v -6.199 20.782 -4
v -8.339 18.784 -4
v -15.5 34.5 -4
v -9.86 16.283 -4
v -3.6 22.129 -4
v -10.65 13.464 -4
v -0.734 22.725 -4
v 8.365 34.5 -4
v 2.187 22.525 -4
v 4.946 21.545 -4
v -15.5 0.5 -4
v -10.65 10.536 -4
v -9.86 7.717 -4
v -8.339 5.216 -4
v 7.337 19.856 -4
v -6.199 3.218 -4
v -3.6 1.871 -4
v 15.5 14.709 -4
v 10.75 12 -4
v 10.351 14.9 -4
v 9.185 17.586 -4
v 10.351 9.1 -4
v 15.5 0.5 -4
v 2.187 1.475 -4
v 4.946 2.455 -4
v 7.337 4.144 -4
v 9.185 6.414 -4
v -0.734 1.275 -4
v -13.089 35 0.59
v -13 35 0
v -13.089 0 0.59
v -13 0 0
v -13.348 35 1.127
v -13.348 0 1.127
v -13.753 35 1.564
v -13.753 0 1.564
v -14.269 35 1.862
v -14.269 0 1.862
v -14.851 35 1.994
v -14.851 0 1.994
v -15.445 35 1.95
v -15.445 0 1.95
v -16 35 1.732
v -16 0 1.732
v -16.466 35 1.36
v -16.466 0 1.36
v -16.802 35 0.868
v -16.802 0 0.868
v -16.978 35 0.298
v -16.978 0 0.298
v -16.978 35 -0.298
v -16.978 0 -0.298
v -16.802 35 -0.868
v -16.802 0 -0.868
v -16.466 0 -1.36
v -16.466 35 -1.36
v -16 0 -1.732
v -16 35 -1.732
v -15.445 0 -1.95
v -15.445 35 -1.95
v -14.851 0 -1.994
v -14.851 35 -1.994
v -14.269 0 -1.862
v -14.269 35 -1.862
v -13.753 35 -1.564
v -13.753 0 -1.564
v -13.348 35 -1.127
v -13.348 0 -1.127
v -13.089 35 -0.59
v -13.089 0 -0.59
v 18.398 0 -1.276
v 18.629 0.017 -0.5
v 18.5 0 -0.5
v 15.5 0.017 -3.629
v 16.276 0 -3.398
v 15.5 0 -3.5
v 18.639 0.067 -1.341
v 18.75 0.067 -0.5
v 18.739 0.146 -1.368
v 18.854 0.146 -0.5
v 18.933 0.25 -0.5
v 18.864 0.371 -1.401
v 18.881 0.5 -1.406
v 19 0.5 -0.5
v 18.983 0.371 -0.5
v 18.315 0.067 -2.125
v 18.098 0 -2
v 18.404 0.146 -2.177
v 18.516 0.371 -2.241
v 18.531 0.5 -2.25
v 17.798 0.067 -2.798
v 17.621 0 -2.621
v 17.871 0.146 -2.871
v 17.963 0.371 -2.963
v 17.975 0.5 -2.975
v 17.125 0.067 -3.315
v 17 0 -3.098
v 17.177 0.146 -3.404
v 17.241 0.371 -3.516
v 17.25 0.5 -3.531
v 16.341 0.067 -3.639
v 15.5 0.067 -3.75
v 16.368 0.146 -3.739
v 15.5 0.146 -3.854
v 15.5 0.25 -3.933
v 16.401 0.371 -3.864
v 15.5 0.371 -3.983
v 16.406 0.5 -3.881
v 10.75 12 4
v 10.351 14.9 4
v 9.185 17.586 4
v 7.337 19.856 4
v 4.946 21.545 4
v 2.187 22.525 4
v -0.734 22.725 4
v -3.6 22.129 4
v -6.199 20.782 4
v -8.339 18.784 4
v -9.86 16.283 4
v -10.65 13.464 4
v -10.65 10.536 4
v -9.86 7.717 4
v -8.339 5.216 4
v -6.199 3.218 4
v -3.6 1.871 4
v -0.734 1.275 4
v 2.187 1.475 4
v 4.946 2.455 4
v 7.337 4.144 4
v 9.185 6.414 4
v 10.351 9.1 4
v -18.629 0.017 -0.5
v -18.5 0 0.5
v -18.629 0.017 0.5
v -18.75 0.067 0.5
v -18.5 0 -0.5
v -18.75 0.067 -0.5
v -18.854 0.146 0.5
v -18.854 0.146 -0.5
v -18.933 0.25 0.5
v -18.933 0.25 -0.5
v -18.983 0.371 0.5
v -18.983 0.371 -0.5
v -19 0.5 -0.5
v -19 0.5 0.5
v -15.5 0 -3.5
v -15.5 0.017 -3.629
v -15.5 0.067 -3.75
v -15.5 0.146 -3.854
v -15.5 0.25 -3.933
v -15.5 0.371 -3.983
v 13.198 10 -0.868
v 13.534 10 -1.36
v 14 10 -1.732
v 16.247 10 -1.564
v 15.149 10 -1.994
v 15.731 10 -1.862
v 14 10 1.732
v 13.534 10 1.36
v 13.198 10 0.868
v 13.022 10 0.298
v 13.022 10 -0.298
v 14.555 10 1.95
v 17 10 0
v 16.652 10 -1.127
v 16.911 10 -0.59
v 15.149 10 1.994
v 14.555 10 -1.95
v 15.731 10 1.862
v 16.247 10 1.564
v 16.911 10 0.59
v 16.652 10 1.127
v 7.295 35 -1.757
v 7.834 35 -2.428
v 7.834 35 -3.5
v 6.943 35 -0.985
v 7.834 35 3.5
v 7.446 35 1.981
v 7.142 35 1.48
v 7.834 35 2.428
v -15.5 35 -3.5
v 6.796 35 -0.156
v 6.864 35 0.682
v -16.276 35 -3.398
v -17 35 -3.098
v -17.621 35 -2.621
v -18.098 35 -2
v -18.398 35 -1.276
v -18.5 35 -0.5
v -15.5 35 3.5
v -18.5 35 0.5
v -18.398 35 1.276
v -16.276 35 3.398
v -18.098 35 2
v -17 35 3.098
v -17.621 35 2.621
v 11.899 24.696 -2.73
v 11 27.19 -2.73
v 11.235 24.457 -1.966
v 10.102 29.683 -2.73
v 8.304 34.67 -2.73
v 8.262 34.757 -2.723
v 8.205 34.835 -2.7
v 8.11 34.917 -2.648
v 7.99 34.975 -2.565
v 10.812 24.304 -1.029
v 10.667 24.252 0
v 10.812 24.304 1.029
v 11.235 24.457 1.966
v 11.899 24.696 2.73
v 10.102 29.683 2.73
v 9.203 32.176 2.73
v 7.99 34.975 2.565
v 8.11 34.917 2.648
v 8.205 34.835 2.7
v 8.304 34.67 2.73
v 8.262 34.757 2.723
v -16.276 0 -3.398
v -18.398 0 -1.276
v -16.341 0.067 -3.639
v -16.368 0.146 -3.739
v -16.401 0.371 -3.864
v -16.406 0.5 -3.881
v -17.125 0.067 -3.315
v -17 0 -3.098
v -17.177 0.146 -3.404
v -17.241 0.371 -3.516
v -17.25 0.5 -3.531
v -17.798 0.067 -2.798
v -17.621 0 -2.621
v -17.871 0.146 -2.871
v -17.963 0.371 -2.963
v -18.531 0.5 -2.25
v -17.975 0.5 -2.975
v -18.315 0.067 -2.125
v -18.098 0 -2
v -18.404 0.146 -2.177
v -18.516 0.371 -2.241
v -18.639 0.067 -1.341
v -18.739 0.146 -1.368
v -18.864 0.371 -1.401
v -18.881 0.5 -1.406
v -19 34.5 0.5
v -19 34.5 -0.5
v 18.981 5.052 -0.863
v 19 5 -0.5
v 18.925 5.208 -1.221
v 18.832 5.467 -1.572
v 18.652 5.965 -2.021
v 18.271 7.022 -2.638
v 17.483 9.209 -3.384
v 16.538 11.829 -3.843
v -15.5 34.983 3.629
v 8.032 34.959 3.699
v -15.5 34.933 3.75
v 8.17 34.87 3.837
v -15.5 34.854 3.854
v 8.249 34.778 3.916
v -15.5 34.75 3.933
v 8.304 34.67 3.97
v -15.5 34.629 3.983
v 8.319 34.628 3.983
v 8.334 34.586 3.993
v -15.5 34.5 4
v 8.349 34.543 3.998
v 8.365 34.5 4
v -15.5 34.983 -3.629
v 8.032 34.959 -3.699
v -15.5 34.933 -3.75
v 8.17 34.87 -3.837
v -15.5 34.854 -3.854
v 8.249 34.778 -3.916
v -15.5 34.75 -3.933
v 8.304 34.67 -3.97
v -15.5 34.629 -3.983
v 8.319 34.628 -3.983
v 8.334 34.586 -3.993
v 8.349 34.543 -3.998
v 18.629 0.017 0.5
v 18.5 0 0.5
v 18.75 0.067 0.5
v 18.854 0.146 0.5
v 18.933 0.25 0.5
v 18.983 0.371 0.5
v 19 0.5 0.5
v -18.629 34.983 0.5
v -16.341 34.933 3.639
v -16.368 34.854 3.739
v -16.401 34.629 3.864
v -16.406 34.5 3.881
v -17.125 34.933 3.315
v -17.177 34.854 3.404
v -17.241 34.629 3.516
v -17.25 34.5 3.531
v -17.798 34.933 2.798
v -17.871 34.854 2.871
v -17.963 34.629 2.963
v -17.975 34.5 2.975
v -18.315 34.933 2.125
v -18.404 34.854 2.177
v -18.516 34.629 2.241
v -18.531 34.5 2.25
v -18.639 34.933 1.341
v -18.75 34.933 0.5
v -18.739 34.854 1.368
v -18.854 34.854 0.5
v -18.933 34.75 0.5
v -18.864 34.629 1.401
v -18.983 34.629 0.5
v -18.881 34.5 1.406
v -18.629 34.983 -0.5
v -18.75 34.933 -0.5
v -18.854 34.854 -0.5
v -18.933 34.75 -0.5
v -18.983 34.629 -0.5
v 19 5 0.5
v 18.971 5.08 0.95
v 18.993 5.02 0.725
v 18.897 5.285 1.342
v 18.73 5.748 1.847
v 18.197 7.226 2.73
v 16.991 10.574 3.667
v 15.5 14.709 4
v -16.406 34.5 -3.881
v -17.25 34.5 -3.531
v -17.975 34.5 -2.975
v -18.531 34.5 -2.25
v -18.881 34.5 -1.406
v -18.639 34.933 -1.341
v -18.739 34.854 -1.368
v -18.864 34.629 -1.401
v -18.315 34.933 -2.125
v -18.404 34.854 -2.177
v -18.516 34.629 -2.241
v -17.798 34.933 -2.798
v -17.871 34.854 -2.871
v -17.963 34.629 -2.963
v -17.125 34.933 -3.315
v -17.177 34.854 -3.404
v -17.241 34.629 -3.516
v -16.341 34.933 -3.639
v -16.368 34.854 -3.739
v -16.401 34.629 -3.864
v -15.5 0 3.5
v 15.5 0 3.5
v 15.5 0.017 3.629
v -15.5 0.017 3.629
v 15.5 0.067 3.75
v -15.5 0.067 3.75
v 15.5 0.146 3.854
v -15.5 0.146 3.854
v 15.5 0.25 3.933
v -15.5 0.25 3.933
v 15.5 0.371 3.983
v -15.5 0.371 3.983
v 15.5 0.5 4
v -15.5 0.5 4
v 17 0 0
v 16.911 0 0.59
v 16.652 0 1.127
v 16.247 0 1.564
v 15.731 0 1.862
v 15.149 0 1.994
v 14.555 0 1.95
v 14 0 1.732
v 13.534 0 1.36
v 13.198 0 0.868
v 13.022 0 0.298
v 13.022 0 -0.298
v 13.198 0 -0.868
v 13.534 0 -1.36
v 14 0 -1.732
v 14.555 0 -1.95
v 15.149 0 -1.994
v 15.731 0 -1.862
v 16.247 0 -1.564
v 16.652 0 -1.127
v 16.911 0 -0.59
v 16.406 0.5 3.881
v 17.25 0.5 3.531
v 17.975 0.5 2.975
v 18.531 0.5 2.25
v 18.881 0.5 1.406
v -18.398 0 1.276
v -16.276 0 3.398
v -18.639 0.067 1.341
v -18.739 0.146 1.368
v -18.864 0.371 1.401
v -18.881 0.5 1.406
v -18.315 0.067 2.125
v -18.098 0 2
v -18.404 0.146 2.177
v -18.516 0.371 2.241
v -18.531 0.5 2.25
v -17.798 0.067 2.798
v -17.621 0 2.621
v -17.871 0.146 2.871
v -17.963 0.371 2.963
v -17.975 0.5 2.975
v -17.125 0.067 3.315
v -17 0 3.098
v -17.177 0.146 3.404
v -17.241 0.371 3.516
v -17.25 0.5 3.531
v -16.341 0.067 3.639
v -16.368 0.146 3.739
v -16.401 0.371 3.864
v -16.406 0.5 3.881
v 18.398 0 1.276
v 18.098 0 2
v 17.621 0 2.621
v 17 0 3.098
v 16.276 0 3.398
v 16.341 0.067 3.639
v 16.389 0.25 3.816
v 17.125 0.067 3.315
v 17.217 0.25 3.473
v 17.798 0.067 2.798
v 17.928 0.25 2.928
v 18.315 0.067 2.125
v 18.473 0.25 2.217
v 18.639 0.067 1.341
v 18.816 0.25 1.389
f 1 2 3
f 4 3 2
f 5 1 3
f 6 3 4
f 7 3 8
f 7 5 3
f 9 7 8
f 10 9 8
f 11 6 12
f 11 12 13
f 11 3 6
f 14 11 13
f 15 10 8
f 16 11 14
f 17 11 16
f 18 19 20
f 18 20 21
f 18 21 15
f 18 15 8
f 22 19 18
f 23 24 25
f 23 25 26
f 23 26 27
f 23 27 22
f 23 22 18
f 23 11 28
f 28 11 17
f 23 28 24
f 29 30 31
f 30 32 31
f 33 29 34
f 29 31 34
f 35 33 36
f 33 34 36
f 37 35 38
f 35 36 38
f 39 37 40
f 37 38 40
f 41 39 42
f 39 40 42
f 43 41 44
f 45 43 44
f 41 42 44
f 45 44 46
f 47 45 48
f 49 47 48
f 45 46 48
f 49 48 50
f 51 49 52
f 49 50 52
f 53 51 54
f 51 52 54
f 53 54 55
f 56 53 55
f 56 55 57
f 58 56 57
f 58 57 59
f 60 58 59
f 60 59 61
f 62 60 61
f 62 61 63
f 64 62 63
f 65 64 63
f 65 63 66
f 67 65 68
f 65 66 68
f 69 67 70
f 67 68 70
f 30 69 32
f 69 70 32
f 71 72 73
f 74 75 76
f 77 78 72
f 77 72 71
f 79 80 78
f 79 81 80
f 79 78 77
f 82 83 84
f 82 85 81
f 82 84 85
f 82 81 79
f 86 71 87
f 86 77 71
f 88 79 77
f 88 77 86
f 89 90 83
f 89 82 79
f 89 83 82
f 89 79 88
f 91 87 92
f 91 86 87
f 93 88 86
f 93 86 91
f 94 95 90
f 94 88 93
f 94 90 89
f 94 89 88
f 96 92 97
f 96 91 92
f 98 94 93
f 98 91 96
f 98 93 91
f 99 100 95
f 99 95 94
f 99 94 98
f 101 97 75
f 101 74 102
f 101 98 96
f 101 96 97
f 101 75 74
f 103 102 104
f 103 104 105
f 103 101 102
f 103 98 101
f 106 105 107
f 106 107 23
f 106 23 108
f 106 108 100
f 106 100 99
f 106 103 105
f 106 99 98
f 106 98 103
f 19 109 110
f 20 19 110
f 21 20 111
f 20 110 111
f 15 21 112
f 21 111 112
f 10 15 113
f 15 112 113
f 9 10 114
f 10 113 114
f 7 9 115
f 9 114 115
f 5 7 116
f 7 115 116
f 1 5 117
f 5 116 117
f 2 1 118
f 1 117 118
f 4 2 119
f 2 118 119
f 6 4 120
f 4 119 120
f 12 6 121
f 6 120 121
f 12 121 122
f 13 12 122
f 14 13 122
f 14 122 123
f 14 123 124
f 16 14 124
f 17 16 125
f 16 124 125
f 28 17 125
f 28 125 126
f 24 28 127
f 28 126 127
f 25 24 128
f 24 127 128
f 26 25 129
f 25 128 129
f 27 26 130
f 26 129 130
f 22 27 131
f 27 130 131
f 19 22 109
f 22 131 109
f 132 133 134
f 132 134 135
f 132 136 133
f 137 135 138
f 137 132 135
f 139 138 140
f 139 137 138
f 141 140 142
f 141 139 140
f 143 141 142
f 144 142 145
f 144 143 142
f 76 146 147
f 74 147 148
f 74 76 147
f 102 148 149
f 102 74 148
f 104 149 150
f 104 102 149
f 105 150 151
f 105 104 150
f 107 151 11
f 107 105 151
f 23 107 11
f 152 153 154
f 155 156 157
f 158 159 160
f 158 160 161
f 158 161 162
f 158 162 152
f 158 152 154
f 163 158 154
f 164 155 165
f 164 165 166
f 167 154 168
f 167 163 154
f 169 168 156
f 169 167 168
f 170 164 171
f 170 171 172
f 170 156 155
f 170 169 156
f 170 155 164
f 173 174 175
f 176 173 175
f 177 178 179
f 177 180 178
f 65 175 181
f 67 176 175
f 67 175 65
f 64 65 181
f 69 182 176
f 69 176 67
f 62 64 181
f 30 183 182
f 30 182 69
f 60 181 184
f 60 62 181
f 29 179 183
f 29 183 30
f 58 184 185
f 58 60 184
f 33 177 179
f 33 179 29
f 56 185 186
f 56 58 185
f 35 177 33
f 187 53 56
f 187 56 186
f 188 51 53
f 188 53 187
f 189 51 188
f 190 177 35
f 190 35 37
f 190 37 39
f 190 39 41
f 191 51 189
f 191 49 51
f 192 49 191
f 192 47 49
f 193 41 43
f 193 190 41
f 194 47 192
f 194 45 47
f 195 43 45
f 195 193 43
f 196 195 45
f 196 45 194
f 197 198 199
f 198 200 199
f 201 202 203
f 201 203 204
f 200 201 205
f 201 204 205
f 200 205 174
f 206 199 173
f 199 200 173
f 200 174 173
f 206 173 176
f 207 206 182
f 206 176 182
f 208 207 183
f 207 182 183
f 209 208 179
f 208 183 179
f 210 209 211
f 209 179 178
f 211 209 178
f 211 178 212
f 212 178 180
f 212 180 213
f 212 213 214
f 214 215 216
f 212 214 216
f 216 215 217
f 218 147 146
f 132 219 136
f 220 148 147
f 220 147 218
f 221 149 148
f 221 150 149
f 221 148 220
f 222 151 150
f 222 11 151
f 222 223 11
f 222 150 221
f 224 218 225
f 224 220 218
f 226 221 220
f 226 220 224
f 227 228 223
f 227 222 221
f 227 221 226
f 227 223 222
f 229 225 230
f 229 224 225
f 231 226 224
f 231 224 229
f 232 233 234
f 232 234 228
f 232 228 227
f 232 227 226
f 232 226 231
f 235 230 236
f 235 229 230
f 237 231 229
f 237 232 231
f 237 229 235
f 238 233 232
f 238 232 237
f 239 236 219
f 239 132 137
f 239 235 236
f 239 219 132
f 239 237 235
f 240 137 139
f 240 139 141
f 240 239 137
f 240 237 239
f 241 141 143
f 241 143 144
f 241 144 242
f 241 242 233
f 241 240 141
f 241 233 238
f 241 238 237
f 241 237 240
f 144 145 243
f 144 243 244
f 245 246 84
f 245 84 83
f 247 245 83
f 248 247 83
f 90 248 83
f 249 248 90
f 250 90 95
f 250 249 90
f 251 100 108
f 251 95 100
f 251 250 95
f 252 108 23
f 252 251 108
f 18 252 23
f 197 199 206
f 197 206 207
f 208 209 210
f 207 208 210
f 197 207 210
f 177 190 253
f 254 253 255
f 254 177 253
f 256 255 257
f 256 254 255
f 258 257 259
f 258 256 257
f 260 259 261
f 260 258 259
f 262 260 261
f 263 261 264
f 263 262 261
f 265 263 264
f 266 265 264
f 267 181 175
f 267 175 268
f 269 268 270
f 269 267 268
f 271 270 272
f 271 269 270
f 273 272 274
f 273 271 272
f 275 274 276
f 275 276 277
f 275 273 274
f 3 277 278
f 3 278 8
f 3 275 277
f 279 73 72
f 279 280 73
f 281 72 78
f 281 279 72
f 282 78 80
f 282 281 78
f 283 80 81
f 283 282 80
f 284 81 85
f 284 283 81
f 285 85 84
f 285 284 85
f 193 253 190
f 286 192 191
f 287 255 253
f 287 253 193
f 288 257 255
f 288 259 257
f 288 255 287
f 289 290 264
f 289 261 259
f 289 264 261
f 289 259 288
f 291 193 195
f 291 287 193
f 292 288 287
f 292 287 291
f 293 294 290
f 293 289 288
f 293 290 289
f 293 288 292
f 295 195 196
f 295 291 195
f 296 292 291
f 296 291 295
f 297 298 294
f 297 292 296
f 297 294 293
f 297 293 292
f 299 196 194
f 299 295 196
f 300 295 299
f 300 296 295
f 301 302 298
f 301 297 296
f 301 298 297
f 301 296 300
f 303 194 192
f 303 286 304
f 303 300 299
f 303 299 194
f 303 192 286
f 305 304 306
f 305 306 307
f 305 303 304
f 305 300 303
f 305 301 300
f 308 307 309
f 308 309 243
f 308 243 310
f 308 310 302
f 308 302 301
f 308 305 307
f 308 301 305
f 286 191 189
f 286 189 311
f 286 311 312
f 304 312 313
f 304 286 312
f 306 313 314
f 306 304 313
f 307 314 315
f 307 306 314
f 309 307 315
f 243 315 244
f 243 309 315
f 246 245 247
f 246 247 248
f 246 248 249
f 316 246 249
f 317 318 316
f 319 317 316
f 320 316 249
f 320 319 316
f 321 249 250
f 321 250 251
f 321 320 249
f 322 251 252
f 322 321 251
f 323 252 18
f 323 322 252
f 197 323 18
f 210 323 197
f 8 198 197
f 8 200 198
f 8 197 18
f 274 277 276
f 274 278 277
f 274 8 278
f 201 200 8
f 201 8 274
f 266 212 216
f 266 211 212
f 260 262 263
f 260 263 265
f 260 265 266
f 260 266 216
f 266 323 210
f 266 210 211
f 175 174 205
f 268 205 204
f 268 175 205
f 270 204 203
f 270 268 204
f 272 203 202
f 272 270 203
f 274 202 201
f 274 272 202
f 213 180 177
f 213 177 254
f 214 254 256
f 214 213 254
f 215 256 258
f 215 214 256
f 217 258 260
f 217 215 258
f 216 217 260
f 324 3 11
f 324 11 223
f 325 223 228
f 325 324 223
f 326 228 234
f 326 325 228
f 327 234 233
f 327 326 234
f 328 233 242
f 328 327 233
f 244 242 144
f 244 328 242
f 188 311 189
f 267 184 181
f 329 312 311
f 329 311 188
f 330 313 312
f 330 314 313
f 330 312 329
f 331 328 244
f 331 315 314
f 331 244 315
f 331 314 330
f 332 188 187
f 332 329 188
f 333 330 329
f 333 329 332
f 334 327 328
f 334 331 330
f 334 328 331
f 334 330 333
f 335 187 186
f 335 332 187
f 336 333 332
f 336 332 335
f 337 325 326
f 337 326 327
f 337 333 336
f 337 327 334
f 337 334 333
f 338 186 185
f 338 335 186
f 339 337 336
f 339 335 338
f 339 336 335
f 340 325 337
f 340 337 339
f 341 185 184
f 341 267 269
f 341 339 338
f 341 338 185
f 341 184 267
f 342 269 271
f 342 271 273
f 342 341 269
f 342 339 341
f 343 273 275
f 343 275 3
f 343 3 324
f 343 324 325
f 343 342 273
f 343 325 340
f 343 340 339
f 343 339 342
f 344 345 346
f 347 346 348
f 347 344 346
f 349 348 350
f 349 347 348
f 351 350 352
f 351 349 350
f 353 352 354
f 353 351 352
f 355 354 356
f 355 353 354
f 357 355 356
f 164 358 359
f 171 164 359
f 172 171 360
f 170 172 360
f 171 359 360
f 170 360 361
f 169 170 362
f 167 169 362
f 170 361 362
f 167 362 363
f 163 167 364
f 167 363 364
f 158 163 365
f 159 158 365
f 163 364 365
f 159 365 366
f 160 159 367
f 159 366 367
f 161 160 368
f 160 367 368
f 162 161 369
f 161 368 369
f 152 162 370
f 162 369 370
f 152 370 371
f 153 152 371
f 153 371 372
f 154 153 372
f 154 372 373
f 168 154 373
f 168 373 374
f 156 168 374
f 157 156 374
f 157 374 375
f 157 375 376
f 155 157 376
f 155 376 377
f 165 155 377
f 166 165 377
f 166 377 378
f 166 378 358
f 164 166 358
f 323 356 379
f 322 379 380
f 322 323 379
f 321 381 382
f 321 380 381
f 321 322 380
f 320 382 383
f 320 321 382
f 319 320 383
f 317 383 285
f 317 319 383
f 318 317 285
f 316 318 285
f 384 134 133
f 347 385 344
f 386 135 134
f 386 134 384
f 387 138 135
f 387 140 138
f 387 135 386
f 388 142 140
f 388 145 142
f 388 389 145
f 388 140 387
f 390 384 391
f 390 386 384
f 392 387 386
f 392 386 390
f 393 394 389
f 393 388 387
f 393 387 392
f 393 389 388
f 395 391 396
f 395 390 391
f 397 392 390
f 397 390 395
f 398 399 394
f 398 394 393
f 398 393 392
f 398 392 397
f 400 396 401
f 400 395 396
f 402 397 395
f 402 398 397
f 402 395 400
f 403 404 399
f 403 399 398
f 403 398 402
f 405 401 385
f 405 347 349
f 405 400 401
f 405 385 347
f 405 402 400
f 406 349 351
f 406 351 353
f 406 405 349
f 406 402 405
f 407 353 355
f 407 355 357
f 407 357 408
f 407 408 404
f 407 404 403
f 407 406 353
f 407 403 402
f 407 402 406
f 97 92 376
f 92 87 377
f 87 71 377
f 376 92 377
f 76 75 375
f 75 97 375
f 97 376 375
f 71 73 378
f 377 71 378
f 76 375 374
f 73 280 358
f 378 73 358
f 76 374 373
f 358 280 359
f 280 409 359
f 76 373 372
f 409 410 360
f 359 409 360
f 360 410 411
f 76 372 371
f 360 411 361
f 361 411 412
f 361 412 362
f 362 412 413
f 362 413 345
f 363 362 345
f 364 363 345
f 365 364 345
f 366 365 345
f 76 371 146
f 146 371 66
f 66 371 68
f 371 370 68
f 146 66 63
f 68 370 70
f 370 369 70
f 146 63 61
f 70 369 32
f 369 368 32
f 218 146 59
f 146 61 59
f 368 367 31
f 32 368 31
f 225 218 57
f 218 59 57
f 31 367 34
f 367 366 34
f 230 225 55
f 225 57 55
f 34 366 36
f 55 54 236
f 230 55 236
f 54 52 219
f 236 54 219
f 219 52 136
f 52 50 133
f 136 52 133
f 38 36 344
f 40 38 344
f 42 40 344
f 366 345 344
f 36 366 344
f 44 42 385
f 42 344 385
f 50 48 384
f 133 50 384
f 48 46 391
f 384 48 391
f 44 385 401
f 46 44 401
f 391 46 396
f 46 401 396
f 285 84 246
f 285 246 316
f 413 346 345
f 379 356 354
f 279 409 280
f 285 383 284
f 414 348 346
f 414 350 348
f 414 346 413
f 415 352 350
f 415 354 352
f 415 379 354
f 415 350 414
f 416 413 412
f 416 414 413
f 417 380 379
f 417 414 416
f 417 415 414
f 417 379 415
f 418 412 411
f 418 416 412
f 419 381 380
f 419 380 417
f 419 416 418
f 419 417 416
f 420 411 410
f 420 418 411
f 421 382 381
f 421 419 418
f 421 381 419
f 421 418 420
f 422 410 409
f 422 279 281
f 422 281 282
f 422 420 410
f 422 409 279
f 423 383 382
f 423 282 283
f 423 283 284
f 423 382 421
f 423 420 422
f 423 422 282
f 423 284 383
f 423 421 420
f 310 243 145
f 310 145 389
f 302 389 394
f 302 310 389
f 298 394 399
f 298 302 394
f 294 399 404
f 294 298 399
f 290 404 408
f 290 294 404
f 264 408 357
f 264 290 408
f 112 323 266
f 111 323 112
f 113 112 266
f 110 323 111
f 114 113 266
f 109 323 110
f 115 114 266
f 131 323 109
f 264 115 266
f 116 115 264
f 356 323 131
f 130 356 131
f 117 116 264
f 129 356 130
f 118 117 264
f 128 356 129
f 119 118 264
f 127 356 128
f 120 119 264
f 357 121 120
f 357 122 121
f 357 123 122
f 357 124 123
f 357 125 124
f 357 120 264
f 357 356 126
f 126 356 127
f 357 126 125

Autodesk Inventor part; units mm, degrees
ref_plane "YZ Plane" through (0, 0, 0) normal (1, 0, 0) x (0, 1, 0)
ref_plane "XZ Plane" through (0, 0, 0) normal (0, 1, 0) x (-1, 0, 0)
ref_plane "XY Plane" through (0, 0, 0) normal (0, 0, 1) x (1, 0, 0)
sketch "Эскиз2" plane through (0, 0, 0) normal (0, 1, 0) x (-1, 0, 0)
  line L0 (19, -4) -> (-19, -4)
  line L1 (-19, -4) -> (-19, 4)
  line L2 (-19, 4) -> (19, 4)
  line L3 (19, 4) -> (19, -4)
  line L4 (19, -4) -> (-19, 4) construction
  line L5 (-19, -4) -> (19, 4) construction
  line L6 (19, 0) -> (-19, 0) construction
  circle A0 centre (-15, 0) radius 2
  line L7 (0, -4) -> (0, 4) construction
  circle A1 centre (15, 0) radius 2
  point P0 (0, 0)
  dimension "d1" = 30
  dimension "d2" = 4
  dimension "d3" = 38
  dimension "d4" = 8
extrude "Выдавливание1" add sketch "Эскиз2" along normal blind 35 contours L0 L1 L2 L3 | A0 | A1
fillet "Сопряжение1" radius 3.5 4 edges at (19, 17.5, 4) (19, 17.5, -4) (-19, 17.5, 4) (-19, 17.5, -4)
sketch "Эскиз3" plane through (-15.5, 0, 4) normal (0, 0, 1) x (1, 0, 0)
  line L0 (0, 0) -> (0, 35) construction
  line L1 (0, 0) -> (31, 0) construction
  line L2 (31, 35) -> (31, 0) construction
  line L3 (0, 35) -> (31, 35) construction
  line L4 (34.5, 35) -> (31, 35) construction
  line L5 (31, 35) -> (31, 0) construction
  line L6 (31, 0) -> (34.5, 0) construction
  line L7 (34.5, 0) -> (34.5, 35) construction
  line L8 (0, 35) -> (-3.5, 35) construction
  line L9 (-3.5, 35) -> (-3.5, 0) construction
  line L10 (-3.5, 0) -> (0, 0) construction
  line L11 (0, 0) -> (0, 35) construction
  line L12 (0, 0) -> (0, 35) construction
  line L13 (29, 35) -> (32, 35) construction
  line L14 (29, 0) -> (32, 0) construction
  line L15 (-1, 35) -> (2, 35) construction
  line L16 (-1, 0) -> (2, 0) construction
  line L17 (-1, 35) -> (2, 35) construction
  line L18 (-1, 0) -> (2, 0) construction
  line L19 (29, 35) -> (2, 0) construction
  line L20 (0, 35) -> (31, 35) construction
  line L21 (-3.5, 35) -> (0, 35) projected
  line L22 (0, 0) -> (31, 0) projected
  line L23 (0, 35) -> (31, 0) construction
  line L24 (15.5, 17.5) -> (15.5, 0) construction
  circle A0 centre (15.5, 12) radius 10.75
  dimension "d22" = 21.5
  dimension "d23" = 12
extrude "Выдавливание2" cut sketch "Эскиз3" against normal blind 35
sketch "Эскиз4" plane through (-15.5, 0, 4) normal (0, 0, 1) x (1, 0, 0)
  circle A0 centre (15.5, 12) radius 10.5 construction
  line L0 (0, 0) -> (0, 35) construction
  line L1 (0, 0) -> (31, 0) construction
  line L2 (31, 35) -> (31, 0) construction
  line L3 (0, 35) -> (31, 35) construction
  line L4 (0, 35) -> (-3.5, 35) construction
  line L5 (-3.5, 35) -> (-3.5, 0) construction
  line L6 (-3.5, 0) -> (0, 0) construction
  line L7 (0, 0) -> (0, 35) construction
  line L8 (34.5, 35) -> (31, 35) construction
  line L9 (31, 35) -> (31, 0) construction
  line L10 (31, 0) -> (34.5, 0) construction
  line L11 (34.5, 0) -> (34.5, 35) construction
  arc A1 (-1, 2.5793) -> (34.5, 12) centre (15.5, 12) ccw construction
  line L12 (-3.5, 0) -> (-3.5, 35) construction
  line L13 (34.5, 0) -> (34.5, 35) construction
  arc A2 (-3.5, 12) -> (-1, 2.5793) centre (15.5, 12) ccw construction
  line L14 (23.5012, 38.5457) -> (37.6912, 39.4976)
  line L15 (37.6912, 39.4976) -> (34.5, 5)
  circle A3 centre (15.5, 12) radius 15.5
  line L16 (34.5, 0) -> (31, 0) construction
  line L17 (34.5, 0) -> (34.5, 5) construction
  line L18 (34.5, 5) -> (23.6848, 35)
  line L19 (31, 35) -> (0, 35) construction
  line L20 (23.5012, 38.5457) -> (23.6848, 35)
  point P0 (15.5, 0)
  dimension "d18" = 5
  dimension "d24" = 31
extrude "Выдавливание3" cut sketch "Эскиз4" against normal blind 35 contours L14 L15 L18 L20
sketch "Эскиз5" plane through (0, 0, 0) normal (0, -1, 0) x (1, 0, 0)
  circle A0 centre (-15, 0) radius 2 projected
  circle A1 centre (15, 0) radius 2 projected
  point P0 (0, 0)
extrude "Выдавливание4" cut sketch "Эскиз5" against normal up to surface (35 mm away) contours A0
extrude "Выдавливание5" cut sketch "Эскиз5" against normal blind 10 contours A1
fillet "Сопряжение2" radius 0.5 14 edges at (-17.9749, 35, 2.9749) (-19, 35, 0) (-17.9749, 35, -2.9749) (-3.6576, 35, -4) (-3.6576, 35, 4) (8.1848, 35, 0) (17.9749, 0, 2.9749) (19, 0, 0) (17.9749, 0, -2.9749) (0, 0, -4) (-17.9749, 0, -2.9749) (-19, 0, 0) (-17.9749, 0, 2.9749) (0, 0, 4)
ref_plane "РабПлоскость1" through (-18.5, 35, 0) normal (0.3391, -0.9407, 0) x (0.9407, 0.3391, 0)
sketch "Эскиз6" plane through (-18.5, 35, 0) normal (0.3391, -0.9407, 0) x (0.9407, 0.3391, 0)
  ellipse E0 centre (23.0361, 0) end of major axis (23.0361, -2) minor radius 1.8815 construction
  ellipse E1 centre (19.6447, 0) end of major axis (19.6447, -2) minor radius 1.8815 construction
  line L0 (19.6447, 0) -> (23.0361, 0) construction
  circle A0 centre (27.2937, 0) radius 3.5
  point P0 (5.5337, 0)
  dimension "d26" = 7
extrude "Выдавливание6" cut sketch "Эскиз6" along normal blind 20
properties part number "mid_mount_v3" material "Пластик АБС"
